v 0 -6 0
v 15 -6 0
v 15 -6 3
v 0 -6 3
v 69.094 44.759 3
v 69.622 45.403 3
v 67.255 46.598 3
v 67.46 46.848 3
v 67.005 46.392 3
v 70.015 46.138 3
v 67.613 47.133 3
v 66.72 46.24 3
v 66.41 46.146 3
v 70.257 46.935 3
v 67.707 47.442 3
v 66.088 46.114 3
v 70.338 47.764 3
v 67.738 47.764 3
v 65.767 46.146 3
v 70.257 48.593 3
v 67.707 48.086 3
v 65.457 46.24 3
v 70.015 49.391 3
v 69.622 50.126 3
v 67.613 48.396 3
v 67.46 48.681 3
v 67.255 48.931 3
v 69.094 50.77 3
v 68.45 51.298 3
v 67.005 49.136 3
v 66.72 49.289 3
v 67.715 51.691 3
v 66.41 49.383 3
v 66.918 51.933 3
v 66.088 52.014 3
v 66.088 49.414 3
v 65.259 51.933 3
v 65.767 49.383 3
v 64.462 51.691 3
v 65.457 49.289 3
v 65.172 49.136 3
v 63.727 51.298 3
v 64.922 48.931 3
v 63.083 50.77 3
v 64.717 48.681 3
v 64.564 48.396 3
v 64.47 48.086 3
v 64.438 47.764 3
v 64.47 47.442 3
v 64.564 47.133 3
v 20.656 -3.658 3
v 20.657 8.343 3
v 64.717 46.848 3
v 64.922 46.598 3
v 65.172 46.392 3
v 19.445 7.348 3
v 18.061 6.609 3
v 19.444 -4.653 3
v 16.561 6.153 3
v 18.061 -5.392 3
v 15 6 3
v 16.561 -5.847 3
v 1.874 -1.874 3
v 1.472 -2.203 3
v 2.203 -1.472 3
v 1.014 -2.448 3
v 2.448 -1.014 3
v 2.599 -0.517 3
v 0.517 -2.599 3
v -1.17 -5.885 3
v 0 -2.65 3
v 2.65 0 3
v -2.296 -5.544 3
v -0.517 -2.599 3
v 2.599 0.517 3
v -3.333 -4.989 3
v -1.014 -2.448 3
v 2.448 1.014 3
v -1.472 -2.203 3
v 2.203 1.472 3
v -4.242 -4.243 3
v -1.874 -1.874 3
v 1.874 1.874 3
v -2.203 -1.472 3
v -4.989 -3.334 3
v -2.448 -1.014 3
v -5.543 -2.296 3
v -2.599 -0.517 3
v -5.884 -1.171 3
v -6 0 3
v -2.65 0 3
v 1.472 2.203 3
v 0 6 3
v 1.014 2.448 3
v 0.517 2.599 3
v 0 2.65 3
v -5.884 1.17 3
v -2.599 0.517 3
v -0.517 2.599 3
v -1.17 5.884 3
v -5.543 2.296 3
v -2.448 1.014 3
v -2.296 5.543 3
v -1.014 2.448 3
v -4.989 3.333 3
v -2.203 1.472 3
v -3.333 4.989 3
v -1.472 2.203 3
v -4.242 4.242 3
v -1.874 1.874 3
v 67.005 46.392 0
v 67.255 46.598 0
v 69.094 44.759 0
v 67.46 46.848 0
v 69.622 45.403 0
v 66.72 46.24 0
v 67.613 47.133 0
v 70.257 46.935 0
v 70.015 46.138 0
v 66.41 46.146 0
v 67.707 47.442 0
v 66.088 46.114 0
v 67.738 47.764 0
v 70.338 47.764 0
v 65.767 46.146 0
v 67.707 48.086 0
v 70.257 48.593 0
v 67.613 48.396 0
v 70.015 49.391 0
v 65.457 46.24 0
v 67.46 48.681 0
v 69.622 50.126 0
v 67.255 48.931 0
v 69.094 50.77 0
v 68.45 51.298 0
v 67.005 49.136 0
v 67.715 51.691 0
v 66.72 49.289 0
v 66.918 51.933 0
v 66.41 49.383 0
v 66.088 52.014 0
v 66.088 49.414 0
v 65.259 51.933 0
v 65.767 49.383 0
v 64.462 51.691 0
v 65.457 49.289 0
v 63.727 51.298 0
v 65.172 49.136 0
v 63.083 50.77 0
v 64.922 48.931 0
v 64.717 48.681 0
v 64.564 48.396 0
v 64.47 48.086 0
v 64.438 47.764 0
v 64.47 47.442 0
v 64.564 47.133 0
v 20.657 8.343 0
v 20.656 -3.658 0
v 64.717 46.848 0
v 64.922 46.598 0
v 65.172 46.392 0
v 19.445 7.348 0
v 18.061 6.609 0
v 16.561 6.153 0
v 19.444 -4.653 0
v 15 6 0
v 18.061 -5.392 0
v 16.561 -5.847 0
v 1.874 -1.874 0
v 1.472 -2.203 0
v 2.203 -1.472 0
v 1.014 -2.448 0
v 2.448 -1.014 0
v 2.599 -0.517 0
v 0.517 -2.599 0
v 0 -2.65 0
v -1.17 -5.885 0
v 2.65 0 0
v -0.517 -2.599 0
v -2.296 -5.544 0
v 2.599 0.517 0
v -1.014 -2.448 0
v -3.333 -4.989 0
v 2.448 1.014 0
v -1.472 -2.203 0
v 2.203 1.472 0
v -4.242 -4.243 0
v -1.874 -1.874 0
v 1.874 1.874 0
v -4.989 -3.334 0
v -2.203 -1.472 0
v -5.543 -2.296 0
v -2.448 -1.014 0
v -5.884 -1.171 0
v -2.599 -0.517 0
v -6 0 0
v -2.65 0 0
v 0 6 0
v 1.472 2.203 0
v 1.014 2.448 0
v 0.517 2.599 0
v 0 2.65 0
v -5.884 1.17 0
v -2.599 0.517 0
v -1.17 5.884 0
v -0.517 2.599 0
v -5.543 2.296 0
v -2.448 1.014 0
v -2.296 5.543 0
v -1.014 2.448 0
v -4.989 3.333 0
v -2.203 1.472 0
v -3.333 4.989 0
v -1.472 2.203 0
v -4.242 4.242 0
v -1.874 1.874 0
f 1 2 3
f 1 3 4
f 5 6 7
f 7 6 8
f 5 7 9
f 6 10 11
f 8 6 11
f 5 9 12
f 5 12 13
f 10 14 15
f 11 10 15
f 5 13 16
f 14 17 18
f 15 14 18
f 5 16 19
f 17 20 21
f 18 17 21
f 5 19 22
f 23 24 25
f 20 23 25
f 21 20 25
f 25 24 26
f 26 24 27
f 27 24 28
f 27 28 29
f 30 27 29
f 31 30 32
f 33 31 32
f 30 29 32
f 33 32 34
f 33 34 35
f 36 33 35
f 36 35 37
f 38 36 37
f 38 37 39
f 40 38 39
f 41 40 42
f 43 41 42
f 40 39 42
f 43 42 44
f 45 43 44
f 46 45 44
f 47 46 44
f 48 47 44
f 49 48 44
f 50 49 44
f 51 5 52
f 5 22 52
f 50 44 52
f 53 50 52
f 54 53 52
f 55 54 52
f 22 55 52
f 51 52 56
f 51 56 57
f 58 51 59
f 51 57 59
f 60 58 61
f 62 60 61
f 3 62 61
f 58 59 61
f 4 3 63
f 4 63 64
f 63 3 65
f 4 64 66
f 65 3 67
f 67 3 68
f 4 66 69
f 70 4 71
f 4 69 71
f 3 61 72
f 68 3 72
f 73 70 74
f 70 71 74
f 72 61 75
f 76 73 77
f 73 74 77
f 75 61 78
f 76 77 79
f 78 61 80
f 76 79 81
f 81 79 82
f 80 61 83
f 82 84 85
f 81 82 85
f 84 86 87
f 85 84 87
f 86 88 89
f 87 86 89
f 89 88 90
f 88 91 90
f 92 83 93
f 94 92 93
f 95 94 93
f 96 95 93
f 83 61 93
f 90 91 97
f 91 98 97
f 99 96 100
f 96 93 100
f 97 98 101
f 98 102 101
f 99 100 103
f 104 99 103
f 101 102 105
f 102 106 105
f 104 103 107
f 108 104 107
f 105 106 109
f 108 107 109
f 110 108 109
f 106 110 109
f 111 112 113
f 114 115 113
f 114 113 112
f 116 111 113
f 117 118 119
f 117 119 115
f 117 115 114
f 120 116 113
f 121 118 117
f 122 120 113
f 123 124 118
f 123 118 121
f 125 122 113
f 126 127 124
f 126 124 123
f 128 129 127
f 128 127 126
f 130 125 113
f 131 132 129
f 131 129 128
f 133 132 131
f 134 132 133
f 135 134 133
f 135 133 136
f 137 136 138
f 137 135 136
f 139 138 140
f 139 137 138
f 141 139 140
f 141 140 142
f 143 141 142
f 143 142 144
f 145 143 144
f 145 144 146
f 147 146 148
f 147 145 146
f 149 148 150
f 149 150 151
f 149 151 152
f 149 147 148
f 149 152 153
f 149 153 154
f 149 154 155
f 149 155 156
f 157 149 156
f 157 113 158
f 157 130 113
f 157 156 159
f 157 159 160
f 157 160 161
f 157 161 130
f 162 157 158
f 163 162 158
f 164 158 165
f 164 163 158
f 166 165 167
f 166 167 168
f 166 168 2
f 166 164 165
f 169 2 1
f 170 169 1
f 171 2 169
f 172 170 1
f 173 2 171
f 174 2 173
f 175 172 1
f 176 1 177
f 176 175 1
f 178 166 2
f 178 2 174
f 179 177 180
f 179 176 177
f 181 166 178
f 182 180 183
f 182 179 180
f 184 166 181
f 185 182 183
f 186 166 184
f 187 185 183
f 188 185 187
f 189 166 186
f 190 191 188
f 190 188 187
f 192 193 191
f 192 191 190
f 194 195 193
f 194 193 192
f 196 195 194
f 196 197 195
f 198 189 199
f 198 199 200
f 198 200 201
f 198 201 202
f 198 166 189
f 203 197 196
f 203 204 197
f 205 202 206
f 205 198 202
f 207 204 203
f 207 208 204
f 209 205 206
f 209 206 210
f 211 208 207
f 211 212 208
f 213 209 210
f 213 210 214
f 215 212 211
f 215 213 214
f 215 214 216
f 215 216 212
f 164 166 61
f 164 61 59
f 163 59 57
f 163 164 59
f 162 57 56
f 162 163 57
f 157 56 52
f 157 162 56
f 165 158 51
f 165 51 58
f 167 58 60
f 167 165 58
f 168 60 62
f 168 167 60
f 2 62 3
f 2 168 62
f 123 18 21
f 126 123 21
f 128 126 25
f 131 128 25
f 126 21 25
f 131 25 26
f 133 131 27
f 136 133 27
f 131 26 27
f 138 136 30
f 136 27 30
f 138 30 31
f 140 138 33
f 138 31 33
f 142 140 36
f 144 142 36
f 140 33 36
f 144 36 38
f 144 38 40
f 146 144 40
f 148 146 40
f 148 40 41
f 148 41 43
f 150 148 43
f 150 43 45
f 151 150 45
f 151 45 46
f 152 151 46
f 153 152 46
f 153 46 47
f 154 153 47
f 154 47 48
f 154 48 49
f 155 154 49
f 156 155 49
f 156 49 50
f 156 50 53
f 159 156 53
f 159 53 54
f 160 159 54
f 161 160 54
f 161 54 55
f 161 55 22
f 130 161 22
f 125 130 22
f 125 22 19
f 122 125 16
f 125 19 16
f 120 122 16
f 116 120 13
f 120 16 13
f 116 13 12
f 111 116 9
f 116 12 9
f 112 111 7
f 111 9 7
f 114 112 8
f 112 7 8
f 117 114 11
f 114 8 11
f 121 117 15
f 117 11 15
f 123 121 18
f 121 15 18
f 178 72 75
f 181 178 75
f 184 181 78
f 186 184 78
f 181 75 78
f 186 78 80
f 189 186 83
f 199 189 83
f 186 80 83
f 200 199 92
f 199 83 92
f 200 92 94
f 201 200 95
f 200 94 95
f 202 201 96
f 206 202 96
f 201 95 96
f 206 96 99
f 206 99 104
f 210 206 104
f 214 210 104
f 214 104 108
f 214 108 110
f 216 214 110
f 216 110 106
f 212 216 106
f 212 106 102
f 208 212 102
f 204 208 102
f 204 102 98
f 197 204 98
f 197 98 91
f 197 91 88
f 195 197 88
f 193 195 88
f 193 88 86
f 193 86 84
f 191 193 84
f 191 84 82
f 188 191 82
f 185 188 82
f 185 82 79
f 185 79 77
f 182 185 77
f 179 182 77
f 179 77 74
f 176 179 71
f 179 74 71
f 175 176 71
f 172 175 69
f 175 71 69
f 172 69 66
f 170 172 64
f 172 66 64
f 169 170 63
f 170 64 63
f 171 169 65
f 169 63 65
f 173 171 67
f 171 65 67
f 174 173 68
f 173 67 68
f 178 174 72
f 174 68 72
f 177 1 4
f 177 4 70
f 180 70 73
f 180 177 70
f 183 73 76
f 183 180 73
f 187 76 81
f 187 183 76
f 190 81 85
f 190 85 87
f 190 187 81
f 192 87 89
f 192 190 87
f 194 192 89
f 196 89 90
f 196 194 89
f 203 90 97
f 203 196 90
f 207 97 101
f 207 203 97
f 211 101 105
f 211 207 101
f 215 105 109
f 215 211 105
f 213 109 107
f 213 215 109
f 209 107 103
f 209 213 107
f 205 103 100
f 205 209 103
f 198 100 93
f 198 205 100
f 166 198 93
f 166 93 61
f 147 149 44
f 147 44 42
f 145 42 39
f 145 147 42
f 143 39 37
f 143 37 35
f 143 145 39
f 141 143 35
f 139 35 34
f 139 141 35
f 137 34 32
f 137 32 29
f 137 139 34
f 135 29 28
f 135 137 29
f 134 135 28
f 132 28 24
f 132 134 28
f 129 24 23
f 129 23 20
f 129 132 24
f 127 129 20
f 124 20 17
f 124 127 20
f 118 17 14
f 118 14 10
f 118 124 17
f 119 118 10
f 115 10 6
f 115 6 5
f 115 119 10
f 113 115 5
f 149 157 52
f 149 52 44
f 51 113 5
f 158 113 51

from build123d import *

# Parameters (mm, degrees)
EXTRUDE_1_DEPTH     = 3
SKETCH_9_R          = 2.65
SKETCH_9_R_2        = 1.65
CUT_EXTRUDE_5_DEPTH = 6


with BuildPart() as part:
    # 草图1 → 凸台-拉伸1 (new body)
    with BuildSketch(Plane.XY):
        with BuildLine():
            Line((0.000249999, 5.999750001), (14.999750012, 5.999750001))
            ThreePointArc((14.999750012, 5.999750001), (18.061380786, 6.60878139), (20.656854249, 8.343145751))
            Line((20.656854249, 8.343145751), (63.083261121, 50.769552622))
            ThreePointArc((63.083261121, 50.769552622), (69.093668761, 50.769552622), (69.093668761, 44.759144982))
            Line((69.093668761, 44.759144982), (20.65591759, -3.658290659))
            ThreePointArc((20.65591759, -3.658290659), (18.060942301, -5.391607293), (15.000249999, -6.000249999))
            Line((15.000249999, -6.000249999), (0.000249999, -6.000249999))
            ThreePointArc((0.000249999, -6.000249999), (-5.999750001, -0.000249999), (0.000249999, 5.999750001))
        make_face()
    extrude(amount=EXTRUDE_1_DEPTH)

    # 草图9 → 切除-拉伸5 (cut)
    with BuildSketch(Plane.XY.offset(3)):
        Circle(SKETCH_9_R)
        with Locations((66.088464941, 47.764348802)):
            Circle(SKETCH_9_R_2)
    extrude(amount=-CUT_EXTRUDE_5_DEPTH, mode=Mode.SUBTRACT)


solid = part.part
